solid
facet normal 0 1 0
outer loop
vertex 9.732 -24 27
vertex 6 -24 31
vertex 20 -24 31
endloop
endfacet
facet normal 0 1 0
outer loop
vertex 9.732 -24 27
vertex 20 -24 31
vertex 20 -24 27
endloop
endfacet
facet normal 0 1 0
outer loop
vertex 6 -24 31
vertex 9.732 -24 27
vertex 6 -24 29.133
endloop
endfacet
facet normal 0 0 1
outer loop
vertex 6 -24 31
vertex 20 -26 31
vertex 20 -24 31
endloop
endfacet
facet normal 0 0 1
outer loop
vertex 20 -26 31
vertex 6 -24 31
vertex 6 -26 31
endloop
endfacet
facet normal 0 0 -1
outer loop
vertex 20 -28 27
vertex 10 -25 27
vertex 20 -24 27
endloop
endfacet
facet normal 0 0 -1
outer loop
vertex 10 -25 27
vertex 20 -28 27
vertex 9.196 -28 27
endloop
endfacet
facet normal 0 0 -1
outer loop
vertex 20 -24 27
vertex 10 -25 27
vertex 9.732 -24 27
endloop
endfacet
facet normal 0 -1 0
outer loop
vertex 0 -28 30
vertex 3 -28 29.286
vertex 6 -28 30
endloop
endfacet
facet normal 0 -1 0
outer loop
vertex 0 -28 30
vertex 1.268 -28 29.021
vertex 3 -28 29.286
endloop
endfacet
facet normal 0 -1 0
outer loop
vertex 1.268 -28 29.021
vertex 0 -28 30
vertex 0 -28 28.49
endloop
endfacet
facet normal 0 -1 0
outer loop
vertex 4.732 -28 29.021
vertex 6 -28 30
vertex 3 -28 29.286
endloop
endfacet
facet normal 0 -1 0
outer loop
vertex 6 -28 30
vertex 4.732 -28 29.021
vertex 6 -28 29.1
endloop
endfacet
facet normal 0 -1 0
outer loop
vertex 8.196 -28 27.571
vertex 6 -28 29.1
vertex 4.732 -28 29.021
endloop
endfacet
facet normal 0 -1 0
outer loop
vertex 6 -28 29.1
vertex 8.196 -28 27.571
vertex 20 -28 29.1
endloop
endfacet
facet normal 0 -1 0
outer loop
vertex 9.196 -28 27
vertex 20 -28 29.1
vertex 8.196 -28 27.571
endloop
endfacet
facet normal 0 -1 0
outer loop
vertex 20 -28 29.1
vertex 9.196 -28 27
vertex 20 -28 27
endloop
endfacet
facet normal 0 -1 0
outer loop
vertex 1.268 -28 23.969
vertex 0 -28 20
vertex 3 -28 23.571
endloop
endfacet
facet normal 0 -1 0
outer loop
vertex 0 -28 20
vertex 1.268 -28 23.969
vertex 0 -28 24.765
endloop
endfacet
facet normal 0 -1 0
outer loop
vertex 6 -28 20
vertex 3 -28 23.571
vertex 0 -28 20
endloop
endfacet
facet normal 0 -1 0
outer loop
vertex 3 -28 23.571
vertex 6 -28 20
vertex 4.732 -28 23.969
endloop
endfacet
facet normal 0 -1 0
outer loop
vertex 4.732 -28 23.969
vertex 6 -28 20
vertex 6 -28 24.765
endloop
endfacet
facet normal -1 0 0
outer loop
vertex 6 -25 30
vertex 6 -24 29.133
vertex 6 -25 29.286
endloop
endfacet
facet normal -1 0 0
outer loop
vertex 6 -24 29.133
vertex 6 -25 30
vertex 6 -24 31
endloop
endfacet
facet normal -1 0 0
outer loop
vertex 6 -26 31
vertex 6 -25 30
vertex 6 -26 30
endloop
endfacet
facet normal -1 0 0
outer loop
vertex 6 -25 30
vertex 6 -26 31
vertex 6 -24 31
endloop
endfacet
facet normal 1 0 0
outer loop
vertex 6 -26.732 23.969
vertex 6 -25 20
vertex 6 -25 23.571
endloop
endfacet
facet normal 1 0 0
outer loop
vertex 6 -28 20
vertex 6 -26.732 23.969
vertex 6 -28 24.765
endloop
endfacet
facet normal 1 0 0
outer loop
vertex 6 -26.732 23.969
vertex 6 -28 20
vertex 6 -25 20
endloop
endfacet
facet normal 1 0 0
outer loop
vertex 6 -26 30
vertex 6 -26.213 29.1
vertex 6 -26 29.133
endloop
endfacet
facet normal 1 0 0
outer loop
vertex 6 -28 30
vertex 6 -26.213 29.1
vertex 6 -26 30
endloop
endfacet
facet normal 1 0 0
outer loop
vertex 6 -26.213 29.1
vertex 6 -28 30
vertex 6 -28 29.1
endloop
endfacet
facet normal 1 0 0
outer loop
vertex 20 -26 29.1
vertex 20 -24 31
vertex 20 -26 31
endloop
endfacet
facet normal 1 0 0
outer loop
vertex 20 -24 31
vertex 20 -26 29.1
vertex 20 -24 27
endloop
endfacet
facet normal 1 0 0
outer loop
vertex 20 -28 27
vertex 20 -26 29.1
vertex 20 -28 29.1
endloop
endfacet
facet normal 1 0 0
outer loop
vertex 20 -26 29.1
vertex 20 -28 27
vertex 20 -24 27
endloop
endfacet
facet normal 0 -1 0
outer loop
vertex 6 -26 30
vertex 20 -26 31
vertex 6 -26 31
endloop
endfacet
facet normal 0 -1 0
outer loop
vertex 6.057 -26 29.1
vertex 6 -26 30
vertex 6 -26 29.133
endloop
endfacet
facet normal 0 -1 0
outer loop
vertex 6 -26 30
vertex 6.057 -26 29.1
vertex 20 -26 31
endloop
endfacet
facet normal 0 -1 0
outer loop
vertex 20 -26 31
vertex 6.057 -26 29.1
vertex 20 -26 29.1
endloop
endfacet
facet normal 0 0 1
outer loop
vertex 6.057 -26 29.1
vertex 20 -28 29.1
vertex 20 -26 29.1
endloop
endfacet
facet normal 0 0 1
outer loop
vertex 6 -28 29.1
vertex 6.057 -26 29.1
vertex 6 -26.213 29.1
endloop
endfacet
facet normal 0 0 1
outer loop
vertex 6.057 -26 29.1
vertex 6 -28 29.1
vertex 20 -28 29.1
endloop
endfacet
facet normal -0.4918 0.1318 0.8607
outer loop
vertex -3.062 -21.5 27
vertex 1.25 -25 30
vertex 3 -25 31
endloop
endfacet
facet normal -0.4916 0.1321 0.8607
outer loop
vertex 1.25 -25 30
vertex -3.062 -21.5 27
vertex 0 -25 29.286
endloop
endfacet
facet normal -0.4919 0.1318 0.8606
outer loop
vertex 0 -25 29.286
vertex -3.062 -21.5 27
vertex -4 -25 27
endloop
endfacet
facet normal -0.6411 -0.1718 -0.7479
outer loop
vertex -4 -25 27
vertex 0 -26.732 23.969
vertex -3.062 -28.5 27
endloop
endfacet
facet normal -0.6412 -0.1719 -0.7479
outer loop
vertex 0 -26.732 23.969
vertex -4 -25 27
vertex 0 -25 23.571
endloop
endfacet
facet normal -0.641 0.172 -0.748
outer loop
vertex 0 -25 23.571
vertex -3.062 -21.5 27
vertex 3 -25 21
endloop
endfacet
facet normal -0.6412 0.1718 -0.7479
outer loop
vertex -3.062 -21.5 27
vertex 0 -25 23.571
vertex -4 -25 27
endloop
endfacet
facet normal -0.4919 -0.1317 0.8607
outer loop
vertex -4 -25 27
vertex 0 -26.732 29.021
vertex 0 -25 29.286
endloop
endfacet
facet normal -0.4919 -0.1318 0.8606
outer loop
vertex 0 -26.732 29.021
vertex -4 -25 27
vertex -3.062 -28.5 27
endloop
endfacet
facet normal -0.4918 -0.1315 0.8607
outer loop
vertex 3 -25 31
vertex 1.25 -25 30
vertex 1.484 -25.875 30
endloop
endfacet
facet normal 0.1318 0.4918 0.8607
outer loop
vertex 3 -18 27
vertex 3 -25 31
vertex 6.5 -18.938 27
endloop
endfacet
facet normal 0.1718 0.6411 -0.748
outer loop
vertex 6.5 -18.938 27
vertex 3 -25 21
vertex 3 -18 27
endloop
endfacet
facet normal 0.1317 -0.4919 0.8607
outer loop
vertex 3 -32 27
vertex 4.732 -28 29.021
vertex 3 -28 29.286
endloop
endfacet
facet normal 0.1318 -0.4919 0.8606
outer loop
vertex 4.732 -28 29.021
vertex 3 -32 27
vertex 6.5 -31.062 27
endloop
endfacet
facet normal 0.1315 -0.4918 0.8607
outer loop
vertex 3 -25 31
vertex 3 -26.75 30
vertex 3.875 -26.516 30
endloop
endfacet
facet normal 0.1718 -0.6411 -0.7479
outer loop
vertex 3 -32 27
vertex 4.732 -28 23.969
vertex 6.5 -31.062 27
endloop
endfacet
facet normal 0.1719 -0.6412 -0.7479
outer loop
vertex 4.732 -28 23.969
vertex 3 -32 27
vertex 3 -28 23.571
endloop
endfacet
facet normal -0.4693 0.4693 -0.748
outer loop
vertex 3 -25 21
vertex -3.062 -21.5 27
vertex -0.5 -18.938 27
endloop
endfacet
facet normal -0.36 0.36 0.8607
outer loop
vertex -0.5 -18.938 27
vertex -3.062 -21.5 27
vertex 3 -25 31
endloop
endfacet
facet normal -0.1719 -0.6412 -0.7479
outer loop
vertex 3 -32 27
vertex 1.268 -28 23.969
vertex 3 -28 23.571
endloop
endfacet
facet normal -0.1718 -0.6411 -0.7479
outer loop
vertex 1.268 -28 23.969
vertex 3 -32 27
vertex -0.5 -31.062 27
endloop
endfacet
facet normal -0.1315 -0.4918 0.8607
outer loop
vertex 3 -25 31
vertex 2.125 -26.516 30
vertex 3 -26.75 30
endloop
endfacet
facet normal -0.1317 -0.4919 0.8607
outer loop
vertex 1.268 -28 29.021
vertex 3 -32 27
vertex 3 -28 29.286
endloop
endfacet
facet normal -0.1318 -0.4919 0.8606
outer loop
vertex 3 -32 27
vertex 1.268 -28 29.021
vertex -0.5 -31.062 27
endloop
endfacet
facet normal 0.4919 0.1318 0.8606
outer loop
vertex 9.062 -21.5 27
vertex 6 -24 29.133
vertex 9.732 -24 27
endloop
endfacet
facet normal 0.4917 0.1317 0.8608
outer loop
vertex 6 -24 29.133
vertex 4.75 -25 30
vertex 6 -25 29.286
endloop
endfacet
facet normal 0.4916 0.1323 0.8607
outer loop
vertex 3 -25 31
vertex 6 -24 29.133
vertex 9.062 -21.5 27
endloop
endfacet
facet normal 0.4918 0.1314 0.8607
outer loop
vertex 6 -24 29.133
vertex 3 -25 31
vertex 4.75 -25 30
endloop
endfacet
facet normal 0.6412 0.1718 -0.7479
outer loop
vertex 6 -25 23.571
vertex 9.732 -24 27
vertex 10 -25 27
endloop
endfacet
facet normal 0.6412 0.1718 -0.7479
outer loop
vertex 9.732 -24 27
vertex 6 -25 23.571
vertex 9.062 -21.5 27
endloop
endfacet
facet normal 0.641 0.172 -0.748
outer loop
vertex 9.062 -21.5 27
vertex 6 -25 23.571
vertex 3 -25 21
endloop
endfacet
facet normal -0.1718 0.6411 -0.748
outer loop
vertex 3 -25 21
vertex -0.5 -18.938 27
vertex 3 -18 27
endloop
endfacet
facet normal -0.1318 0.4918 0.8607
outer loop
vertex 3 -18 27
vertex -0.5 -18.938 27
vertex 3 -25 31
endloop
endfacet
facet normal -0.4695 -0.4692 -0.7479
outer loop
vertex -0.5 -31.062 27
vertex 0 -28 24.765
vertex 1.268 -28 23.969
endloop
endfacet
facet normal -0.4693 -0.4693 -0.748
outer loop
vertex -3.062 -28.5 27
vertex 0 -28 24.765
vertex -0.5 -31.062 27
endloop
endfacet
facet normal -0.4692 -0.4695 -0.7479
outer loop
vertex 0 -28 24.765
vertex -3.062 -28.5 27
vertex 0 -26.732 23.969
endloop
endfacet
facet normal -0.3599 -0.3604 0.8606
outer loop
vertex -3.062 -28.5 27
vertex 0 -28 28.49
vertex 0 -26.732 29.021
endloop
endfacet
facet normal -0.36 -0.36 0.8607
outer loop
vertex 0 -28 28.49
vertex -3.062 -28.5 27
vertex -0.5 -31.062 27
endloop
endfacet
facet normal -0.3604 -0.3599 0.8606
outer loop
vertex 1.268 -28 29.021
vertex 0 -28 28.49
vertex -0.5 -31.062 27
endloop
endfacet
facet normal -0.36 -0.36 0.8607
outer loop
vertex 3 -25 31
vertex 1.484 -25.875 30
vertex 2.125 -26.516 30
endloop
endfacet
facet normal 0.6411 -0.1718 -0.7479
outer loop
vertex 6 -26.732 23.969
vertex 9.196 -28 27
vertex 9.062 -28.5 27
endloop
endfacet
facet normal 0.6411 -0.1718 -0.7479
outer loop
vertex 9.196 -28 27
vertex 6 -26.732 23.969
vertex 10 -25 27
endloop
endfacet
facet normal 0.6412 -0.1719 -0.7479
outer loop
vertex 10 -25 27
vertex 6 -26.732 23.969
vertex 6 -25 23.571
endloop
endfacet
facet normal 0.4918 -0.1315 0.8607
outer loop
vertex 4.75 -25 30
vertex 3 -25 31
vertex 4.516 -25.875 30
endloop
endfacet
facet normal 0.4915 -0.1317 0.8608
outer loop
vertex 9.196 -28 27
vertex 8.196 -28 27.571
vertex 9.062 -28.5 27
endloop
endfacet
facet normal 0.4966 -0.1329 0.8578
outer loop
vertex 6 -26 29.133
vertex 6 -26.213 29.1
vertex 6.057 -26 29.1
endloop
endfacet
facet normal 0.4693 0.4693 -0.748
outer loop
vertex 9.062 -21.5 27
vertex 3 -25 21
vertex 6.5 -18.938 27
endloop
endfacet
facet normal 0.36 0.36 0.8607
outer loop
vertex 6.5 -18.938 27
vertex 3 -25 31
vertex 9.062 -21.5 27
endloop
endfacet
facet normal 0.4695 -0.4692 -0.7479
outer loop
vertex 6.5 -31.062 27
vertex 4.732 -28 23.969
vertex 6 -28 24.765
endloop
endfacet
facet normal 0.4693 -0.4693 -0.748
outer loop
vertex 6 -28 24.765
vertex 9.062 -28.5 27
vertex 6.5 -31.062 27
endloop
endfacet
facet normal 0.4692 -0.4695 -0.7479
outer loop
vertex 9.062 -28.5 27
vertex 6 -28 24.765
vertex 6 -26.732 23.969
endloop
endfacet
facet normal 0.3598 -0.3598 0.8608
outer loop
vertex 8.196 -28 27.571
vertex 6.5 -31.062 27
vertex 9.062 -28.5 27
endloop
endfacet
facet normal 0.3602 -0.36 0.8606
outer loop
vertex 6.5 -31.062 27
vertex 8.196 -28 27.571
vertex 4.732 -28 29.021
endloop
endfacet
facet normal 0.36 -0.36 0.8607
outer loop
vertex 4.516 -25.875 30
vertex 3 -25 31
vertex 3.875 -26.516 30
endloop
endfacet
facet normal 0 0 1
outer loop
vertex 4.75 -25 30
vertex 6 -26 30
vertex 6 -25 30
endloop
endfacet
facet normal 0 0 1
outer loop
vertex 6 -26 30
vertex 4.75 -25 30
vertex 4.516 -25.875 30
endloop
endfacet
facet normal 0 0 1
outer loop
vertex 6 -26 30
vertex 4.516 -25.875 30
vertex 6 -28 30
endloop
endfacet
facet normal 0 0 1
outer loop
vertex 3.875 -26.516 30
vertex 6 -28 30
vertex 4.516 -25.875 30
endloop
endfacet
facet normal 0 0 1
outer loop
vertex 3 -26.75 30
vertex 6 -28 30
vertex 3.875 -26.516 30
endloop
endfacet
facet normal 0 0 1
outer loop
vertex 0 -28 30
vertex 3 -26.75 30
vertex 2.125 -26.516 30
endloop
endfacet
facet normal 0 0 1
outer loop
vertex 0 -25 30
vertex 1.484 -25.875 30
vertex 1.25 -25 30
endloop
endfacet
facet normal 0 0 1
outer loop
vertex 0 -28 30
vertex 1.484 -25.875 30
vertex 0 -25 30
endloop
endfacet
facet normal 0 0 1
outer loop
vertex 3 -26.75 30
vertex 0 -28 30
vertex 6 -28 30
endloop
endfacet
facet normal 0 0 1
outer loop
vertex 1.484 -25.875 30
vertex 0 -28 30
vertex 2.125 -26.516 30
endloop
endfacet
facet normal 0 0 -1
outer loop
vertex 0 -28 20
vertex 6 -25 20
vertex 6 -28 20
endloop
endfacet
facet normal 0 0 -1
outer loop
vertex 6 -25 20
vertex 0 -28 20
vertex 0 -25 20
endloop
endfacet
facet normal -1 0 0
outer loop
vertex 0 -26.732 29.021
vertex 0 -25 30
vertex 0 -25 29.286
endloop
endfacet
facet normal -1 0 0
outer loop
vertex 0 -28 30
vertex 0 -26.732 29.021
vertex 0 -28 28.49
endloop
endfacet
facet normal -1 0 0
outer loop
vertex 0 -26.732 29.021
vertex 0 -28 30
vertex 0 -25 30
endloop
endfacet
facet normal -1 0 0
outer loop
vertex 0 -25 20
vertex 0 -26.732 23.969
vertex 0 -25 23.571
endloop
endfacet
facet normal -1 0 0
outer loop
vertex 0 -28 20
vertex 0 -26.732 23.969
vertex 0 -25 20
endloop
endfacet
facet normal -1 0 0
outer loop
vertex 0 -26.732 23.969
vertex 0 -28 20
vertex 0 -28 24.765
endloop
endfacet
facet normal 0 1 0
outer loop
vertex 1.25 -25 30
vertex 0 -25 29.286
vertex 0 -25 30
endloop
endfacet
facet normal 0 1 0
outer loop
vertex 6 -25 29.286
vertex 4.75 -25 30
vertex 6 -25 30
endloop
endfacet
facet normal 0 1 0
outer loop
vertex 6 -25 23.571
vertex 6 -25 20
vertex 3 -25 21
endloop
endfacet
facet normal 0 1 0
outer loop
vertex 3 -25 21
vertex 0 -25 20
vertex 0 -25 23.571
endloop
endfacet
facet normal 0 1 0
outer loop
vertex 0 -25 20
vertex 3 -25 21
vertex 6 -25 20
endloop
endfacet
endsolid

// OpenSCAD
translate([-31.5, -30, 1]) {
    rotate(90) {
        translate([2, -51.5, 26]) {
        difference() {
        cube([4, 14, 4]);
                translate([-0.1,-1,2.1]) cube([2.1, 16, 2.1]);
        }
    }
    }
}
translate([3, -25, 1]) rotate_extrude($fn=12) polygon(points = [[0, 20], [0, 30], [7, 26]]);
translate([0, -28, 20]) cube([6, 3, 10]);
